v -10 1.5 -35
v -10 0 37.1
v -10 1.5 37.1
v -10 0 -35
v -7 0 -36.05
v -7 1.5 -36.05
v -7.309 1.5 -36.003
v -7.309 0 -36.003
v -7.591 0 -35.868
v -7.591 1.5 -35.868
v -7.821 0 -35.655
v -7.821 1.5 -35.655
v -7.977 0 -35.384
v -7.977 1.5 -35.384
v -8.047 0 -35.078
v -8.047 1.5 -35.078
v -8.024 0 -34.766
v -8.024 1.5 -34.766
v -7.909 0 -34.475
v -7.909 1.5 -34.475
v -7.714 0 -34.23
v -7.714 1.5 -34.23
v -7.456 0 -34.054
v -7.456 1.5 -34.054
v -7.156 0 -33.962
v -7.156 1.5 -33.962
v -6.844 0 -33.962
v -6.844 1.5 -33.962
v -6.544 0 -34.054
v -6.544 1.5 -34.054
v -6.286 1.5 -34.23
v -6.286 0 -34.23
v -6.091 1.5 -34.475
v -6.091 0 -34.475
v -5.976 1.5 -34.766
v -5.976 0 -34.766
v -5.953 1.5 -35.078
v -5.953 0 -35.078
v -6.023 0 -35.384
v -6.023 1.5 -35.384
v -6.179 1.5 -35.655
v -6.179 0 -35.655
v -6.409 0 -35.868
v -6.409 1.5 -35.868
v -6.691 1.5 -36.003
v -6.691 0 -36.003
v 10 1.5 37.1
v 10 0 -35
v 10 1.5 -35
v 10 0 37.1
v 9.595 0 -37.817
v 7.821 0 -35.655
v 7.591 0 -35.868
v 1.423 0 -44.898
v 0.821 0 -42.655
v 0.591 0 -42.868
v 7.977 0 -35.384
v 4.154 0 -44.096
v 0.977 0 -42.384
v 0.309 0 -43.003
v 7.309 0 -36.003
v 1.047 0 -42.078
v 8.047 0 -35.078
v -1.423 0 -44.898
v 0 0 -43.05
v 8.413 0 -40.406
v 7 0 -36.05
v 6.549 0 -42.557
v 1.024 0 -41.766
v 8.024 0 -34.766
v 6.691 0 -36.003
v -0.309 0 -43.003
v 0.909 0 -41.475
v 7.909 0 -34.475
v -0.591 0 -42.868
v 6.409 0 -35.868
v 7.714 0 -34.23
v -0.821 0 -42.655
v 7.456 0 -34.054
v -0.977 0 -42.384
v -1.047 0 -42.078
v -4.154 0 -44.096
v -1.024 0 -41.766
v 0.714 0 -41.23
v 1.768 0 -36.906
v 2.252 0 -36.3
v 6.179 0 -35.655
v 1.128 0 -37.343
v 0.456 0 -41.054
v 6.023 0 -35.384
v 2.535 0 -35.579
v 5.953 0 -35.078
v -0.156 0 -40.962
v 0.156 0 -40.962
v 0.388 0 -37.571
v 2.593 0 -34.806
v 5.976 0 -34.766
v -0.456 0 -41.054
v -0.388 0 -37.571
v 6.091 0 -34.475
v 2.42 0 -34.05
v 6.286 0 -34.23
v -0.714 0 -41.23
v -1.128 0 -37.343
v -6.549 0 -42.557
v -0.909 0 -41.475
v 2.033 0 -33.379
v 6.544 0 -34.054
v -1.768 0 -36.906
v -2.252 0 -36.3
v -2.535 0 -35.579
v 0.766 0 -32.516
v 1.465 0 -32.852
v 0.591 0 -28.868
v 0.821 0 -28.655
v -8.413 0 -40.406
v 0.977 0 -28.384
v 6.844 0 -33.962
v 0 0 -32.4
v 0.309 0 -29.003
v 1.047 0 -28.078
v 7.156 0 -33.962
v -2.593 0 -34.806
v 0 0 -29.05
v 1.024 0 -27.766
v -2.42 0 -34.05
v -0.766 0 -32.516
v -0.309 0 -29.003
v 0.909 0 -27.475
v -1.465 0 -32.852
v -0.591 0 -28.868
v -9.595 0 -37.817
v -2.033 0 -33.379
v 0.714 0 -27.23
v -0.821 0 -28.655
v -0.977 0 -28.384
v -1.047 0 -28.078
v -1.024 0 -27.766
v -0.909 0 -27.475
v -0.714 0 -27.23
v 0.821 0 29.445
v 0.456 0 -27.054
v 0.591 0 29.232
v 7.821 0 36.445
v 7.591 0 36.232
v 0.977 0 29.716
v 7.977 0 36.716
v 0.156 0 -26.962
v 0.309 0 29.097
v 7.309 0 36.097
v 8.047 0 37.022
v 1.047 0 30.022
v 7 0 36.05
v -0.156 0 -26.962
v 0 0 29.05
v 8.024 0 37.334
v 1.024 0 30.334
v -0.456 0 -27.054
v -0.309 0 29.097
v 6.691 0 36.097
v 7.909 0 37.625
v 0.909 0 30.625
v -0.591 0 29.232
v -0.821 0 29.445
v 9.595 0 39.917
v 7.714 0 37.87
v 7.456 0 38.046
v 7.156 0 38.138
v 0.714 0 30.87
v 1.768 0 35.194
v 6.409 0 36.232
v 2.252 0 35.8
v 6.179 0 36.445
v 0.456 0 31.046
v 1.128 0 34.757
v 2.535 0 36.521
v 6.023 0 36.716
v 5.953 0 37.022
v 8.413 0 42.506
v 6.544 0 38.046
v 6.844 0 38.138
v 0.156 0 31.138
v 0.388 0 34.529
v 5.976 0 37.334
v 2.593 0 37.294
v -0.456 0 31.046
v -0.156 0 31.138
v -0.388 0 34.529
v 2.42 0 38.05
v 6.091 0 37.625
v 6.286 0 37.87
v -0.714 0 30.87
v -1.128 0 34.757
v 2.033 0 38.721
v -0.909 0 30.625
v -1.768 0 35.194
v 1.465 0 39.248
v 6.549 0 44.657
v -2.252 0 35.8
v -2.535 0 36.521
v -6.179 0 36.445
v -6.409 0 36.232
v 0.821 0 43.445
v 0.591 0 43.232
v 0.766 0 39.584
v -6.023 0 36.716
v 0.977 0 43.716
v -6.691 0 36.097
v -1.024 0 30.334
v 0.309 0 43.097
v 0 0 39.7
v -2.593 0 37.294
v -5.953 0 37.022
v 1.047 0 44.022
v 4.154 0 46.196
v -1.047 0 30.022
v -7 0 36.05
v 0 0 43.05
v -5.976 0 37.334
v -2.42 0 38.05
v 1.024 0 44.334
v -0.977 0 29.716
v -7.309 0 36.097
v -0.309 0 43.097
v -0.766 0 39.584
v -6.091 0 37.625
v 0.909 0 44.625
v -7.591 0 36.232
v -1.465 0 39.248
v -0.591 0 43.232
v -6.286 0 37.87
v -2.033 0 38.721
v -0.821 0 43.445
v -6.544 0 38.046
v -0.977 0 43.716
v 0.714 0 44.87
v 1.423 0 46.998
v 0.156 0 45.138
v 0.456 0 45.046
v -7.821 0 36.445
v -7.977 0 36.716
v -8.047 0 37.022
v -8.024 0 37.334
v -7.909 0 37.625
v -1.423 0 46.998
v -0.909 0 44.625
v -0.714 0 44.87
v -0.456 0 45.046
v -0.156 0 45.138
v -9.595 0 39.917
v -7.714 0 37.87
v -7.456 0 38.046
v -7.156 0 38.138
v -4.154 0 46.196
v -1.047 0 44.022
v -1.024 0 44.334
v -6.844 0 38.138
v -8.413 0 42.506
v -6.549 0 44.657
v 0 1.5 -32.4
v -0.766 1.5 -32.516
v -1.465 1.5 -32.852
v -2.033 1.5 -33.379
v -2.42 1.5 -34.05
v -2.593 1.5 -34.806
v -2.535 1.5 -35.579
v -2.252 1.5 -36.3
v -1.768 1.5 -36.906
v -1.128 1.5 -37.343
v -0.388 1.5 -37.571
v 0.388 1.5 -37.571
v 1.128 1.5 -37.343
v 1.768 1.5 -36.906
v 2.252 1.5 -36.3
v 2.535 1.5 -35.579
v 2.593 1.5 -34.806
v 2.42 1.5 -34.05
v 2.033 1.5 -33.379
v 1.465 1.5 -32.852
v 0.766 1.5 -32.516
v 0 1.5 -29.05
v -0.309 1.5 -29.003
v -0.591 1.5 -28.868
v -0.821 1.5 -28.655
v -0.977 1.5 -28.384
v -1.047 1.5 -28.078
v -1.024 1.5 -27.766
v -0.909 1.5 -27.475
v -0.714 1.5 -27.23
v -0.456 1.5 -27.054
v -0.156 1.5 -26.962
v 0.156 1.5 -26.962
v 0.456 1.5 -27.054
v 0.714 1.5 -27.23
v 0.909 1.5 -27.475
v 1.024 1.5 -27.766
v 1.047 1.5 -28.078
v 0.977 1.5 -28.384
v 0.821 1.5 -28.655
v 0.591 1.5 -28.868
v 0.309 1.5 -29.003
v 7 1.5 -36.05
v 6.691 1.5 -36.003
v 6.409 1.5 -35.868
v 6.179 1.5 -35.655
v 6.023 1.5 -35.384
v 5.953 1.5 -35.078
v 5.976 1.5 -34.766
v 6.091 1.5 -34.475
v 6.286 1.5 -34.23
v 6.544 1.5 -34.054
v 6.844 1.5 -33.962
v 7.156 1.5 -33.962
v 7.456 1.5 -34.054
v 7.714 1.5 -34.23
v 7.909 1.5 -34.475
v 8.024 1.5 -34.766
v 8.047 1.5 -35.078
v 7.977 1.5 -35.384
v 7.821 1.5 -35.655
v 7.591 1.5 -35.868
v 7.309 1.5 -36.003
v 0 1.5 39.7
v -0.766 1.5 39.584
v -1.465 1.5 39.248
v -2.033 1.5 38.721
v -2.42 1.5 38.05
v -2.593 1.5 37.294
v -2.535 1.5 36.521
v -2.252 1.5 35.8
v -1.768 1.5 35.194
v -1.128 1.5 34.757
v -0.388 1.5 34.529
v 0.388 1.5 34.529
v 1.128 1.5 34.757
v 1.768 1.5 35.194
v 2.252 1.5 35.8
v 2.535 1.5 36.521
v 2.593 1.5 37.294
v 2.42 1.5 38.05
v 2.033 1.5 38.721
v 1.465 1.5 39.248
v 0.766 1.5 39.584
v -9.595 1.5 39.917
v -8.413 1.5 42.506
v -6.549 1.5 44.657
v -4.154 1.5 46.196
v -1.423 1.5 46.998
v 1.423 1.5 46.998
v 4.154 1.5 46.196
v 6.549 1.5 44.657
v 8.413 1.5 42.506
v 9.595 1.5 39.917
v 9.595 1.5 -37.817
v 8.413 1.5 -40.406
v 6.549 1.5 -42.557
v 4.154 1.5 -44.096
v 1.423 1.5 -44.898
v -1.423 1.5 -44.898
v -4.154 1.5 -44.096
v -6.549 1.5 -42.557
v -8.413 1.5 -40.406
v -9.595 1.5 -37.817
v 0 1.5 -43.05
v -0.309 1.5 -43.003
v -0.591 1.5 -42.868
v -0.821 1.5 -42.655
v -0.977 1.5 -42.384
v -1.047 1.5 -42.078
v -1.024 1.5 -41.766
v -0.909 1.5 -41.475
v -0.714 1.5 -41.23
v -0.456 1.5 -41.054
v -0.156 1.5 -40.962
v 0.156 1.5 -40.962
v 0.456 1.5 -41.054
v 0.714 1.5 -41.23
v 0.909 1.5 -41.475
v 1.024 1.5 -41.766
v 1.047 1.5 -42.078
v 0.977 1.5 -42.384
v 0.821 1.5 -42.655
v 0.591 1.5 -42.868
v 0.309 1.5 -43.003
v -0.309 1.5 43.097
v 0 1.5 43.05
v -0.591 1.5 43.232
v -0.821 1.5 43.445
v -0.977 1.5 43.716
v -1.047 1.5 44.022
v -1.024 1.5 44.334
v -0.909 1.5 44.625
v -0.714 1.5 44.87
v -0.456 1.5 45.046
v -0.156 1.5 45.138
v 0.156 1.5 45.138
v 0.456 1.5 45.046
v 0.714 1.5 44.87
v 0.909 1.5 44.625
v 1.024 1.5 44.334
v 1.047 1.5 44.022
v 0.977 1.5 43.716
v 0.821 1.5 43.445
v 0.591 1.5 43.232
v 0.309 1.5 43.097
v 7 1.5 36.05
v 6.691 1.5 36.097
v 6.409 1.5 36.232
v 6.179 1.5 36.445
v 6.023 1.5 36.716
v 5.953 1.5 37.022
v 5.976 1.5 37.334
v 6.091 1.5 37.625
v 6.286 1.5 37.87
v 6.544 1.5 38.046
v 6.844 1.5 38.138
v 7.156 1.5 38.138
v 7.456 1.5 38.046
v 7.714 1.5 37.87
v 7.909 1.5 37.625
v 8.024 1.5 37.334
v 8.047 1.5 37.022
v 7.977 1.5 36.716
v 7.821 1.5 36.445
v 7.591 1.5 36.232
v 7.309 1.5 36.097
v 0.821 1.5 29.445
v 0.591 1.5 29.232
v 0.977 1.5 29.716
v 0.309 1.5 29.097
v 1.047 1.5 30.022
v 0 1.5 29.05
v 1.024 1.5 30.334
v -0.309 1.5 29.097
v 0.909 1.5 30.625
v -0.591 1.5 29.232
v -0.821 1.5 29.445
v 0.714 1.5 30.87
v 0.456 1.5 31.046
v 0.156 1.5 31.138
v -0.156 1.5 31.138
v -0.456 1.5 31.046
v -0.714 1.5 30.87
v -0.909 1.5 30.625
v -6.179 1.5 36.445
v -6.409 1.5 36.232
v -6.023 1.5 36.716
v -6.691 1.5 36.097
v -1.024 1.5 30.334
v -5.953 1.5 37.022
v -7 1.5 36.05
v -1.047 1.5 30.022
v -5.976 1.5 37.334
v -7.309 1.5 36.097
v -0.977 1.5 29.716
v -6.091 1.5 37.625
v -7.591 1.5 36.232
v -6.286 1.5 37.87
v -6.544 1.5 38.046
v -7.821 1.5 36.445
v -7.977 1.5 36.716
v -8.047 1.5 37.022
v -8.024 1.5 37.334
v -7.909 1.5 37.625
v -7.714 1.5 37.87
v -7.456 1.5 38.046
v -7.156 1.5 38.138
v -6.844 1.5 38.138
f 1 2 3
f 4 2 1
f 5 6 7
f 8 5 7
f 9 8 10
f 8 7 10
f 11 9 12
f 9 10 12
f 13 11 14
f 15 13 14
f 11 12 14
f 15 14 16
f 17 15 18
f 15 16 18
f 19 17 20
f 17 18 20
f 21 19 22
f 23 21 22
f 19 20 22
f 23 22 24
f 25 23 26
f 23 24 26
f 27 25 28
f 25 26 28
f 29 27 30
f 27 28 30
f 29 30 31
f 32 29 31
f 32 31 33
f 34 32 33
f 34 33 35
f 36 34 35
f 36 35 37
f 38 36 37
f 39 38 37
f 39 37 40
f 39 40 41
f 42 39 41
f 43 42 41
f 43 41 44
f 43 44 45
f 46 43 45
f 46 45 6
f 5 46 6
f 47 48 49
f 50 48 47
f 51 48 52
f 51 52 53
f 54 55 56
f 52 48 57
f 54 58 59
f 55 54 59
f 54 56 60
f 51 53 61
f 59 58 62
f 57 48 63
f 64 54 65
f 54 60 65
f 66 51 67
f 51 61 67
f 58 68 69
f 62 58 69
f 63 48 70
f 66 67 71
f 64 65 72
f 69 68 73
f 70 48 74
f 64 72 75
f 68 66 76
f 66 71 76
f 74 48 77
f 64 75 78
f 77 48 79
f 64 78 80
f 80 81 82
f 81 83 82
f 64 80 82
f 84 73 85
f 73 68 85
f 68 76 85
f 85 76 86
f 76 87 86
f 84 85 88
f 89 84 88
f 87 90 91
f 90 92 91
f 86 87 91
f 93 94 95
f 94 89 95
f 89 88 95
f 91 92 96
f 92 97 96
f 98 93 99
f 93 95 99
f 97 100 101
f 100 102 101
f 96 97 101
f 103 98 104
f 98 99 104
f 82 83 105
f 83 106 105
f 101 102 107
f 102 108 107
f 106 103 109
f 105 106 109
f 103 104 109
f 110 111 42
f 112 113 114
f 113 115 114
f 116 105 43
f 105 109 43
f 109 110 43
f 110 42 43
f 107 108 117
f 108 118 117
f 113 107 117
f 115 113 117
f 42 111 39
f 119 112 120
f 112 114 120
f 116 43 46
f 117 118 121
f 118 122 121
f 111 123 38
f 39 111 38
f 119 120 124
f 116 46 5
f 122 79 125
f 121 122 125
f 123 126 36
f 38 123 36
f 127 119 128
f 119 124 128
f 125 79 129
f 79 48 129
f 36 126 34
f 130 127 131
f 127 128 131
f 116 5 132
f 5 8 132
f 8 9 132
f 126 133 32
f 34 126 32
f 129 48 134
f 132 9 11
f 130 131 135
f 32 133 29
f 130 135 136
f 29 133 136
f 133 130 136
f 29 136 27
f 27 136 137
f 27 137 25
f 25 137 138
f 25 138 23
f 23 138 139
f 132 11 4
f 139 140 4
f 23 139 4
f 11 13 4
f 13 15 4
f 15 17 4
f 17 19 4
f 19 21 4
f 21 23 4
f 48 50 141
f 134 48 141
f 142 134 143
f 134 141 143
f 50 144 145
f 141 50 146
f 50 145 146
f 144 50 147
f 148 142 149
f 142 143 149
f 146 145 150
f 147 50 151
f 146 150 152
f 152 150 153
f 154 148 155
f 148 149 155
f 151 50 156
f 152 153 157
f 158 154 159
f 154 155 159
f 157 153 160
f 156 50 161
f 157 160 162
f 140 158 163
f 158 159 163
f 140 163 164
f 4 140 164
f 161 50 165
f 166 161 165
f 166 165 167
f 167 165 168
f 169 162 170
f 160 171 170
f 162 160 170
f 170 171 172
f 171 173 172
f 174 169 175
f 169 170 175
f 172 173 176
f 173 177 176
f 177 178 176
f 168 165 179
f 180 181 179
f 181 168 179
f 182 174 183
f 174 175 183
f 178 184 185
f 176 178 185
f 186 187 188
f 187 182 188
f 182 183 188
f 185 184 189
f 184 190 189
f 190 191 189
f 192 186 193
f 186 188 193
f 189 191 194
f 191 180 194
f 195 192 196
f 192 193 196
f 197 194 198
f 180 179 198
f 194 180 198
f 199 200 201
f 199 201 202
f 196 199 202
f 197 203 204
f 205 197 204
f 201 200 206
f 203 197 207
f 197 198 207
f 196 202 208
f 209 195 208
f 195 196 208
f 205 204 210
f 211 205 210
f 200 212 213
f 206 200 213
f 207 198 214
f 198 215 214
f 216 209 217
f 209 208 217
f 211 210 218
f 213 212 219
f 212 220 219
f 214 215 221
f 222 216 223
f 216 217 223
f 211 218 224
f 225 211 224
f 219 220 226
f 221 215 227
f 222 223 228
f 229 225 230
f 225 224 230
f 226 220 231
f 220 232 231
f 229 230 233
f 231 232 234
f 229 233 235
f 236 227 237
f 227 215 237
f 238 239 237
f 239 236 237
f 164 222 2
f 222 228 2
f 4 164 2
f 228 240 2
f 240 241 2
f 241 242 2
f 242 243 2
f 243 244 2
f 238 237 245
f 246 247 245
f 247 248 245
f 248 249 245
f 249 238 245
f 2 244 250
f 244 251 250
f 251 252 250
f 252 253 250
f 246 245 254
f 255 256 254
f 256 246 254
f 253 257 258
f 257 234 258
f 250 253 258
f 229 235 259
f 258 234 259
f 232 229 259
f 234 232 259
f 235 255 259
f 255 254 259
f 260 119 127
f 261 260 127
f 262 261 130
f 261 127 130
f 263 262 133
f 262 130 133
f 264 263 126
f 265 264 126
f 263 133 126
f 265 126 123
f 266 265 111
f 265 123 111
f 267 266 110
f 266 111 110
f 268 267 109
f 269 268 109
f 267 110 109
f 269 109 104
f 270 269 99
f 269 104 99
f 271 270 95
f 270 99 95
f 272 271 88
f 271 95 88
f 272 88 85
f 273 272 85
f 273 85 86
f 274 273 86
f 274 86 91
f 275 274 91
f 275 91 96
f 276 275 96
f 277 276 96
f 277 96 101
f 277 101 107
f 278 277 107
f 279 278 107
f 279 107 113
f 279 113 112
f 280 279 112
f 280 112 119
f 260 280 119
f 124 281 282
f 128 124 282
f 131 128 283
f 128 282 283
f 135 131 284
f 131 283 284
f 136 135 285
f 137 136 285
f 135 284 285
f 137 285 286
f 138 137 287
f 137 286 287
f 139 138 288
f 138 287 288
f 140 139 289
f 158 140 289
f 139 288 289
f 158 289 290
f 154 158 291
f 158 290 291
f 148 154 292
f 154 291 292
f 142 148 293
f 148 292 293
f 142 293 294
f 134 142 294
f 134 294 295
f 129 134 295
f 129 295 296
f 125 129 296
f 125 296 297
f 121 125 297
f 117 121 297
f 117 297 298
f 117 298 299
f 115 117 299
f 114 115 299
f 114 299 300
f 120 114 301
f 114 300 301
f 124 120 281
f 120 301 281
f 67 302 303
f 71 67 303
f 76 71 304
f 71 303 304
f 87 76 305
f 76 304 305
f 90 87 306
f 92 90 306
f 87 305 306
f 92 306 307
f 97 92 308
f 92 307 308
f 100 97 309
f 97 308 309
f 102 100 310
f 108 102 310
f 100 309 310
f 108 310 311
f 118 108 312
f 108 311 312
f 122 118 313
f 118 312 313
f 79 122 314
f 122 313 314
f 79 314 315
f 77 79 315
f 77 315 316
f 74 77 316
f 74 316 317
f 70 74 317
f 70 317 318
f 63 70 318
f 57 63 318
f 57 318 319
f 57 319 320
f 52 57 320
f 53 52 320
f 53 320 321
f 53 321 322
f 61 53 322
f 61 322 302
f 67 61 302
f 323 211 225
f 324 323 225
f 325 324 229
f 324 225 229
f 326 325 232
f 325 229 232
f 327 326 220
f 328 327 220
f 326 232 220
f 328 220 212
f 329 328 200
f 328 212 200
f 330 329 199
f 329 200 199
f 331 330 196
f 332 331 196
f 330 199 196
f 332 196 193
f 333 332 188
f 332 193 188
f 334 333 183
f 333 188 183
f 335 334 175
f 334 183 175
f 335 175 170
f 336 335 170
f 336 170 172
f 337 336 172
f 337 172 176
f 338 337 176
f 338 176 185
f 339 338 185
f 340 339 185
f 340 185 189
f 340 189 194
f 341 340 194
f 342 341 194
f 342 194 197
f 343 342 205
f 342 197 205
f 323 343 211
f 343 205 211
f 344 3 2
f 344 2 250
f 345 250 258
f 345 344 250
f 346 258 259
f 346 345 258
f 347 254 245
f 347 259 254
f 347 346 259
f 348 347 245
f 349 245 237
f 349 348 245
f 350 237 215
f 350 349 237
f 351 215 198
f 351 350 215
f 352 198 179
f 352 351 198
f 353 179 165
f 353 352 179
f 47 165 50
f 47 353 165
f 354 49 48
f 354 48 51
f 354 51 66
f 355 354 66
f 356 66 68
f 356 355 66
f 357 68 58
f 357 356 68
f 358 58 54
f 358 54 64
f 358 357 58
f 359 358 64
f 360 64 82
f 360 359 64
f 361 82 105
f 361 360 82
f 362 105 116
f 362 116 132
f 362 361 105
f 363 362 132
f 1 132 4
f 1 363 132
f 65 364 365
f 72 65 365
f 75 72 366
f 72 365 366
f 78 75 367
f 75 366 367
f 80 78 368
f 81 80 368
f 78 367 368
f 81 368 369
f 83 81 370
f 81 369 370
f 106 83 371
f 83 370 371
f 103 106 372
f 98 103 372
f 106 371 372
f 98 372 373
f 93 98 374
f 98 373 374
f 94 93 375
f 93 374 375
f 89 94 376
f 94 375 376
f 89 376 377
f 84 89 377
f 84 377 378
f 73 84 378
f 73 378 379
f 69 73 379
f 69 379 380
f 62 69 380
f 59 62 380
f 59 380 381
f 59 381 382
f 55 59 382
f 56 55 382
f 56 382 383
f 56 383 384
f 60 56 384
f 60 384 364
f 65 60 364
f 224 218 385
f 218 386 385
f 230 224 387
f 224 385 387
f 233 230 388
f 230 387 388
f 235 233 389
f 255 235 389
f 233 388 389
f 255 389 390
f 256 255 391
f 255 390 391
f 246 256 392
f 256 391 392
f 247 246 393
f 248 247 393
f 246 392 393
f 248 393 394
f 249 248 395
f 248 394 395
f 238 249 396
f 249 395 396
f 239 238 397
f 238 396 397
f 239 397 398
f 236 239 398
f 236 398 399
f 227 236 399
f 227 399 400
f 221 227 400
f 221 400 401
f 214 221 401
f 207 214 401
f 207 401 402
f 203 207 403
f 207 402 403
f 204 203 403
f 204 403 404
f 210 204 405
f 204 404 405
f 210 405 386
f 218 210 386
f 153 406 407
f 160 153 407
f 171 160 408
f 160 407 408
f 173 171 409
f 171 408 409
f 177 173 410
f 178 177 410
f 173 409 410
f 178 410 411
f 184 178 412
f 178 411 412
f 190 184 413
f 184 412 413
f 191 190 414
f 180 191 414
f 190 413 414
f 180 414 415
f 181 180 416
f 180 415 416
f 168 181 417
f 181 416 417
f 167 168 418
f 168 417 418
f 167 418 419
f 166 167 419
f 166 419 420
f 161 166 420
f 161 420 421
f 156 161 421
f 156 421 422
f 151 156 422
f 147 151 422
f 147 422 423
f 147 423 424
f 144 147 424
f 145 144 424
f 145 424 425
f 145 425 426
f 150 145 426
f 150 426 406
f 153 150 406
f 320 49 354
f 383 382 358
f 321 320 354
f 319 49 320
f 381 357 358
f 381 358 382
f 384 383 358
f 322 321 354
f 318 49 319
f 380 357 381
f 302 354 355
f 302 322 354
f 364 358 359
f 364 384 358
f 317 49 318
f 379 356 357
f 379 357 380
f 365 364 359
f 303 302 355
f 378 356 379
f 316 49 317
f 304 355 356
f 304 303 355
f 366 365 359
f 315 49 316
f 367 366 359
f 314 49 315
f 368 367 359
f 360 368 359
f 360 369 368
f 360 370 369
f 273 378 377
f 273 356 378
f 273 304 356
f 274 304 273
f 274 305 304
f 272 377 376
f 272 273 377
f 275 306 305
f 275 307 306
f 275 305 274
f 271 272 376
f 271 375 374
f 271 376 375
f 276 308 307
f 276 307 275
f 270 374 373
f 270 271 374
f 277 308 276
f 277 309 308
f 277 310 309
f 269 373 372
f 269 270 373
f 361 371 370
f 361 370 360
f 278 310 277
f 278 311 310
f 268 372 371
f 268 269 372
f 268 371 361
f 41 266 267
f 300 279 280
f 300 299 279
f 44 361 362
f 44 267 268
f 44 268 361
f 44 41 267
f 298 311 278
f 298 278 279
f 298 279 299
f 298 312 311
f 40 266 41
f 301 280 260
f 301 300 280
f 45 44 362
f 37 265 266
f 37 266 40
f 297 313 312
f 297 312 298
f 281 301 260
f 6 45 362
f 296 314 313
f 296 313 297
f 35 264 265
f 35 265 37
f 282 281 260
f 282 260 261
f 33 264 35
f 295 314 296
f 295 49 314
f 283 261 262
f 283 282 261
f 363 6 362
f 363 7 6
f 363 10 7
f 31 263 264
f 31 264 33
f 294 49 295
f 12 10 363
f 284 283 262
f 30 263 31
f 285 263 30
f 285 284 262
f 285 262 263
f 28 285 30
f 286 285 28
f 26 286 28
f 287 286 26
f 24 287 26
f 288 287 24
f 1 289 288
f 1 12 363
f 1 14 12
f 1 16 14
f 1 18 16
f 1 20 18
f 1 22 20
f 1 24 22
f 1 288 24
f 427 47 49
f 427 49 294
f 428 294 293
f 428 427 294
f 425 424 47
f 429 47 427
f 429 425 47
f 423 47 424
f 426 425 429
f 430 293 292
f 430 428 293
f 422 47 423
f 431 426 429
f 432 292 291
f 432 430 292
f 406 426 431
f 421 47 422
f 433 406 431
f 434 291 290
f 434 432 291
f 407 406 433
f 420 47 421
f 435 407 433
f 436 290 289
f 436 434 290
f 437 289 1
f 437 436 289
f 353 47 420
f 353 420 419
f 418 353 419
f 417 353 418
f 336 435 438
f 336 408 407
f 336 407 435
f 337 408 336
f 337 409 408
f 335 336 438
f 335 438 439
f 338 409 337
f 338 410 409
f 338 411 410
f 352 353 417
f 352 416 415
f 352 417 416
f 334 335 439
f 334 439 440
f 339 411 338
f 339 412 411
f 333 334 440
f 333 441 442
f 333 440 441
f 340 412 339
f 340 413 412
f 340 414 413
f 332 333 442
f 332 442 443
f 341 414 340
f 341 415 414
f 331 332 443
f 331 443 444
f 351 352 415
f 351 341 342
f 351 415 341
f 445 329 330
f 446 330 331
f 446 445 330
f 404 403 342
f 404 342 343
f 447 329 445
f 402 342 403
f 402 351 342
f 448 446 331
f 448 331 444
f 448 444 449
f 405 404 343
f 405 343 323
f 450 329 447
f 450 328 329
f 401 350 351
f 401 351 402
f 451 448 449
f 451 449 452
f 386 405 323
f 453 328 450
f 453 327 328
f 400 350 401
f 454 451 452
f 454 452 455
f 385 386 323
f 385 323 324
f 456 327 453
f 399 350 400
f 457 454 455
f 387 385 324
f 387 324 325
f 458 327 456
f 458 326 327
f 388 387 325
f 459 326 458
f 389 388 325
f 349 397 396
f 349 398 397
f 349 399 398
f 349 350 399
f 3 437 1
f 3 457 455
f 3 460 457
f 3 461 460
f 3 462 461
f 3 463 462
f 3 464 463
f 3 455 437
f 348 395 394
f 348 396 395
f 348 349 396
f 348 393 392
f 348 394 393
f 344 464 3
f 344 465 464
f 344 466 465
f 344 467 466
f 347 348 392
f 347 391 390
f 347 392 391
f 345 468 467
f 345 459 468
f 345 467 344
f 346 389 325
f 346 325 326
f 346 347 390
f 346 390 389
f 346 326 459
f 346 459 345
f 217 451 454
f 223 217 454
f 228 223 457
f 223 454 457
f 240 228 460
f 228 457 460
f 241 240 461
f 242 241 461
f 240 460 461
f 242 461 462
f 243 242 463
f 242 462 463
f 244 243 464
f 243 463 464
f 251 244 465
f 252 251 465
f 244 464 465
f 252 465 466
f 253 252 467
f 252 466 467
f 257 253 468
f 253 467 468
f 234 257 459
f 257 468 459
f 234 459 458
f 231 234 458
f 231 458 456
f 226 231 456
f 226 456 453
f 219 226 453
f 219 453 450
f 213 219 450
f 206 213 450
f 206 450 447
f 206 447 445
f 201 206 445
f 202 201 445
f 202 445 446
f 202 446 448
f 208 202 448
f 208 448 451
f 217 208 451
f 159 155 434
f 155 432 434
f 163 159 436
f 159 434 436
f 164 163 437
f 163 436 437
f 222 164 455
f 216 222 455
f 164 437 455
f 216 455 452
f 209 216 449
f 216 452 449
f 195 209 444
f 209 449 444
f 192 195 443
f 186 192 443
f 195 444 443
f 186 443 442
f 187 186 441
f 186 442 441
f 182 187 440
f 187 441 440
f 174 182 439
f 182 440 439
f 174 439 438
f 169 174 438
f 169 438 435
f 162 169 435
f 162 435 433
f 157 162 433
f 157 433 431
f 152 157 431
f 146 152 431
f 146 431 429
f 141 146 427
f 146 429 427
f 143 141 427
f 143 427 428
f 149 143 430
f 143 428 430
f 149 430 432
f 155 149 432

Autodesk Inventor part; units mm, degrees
ref_plane "YZ Plane" through (0, 0, 0) normal (1, 0, 0) x (0, 1, 0)
ref_plane "XZ Plane" through (0, 0, 0) normal (0, 1, 0) x (-1, 0, 0)
ref_plane "XY Plane" through (0, 0, 0) normal (0, 0, 1) x (1, 0, 0)
sketch "Sketch1" plane through (0, 0, 0) normal (0, 1, 0) x (-1, 0, 0)
  line L0 (10, -45) -> (-10, -45)
  line L1 (-10, -45) -> (-10, 47.1)
  line L2 (-10, 47.1) -> (10, 47.1)
  line L3 (10, 47.1) -> (10, -45)
  point P0 (0, 0)
  dimension "d0" = 20
  dimension "d1" = 92.1
  dimension "d2" = 45
  dimension "d3" = 10
extrude "Plate1" add sketch "Sketch1" along normal blind 1.5
sketch "Sketch2" plane through (0, 0, 0) normal (0, -1, 0) x (1, 0, 0)
  circle A0 centre (0, 42) radius 0.7835 projected
  circle A1 centre (-7, 35) radius 0.7835 projected
  circle A2 centre (0, 28) radius 0.7835 projected
  circle A3 centre (7, 35) radius 0.7835 projected
  circle A4 centre (0, -28) radius 0.7835 projected
  circle A5 centre (-7, -35) radius 0.7835 projected
  circle A6 centre (0, -42) radius 0.7835 projected
  circle A7 centre (7, -35) radius 0.7835 projected
  circle A8 centre (7, 37.1) radius 0.7835
  circle A9 centre (0, 30.1) radius 0.7835
  circle A10 centre (-7, 37.1) radius 0.7835
  circle A11 centre (0, 44.1) radius 0.7835
  point P0 (0, 0)
hole "Hole1" at (0, 0, 30.1) at (7, 0, 37.1) at (0, 0, 44.1) at (-7, 0, 37.1) at (0, 0, -42) at (7, 0, -35) at (0, 0, -28) at (-7, 0, -35) direction (0, 1, 0) diameter 2.1 depth 1.5
sketch "Sketch3" plane through (0, 1.5, 0) normal (0, 1, 0) x (1, 0, 0)
  arc A0 (10, 35) -> (-10, 35) centre (0, 35) ccw
  arc A1 (-10, -37.1) -> (10, -37.1) centre (0, -37.1) ccw
  line L0 (-10, 35) -> (-10, -37.1)
  line L1 (10, 35) -> (10, -37.1)
  line L2 (10, 45) -> (10, -47.1) projected
  line L3 (-10, 45) -> (10, 45)
  line L4 (10, 45) -> (10, -47.1)
  line L5 (10, -47.1) -> (-10, -47.1)
  line L6 (-10, -47.1) -> (-10, 45)
  point P0 (0, 0)
  point P1 (0, 45)
  point P2 (10, 45)
  point P3 (10, 35)
  point P4 (-10, -37.1)
  point P5 (0, -47.1)
  point P6 (1.4107, 44.9)
  point P7 (10, 35)
  dimension "d12" = 35
  dimension "d13" = 37.1
  dimension "d14" = 10
  dimension "d15" = 10
  dimension "d16" = 10
  dimension "d17" = 20
  dimension "d18" = 92.1
extrude "Extrusion1" cut sketch "Sketch3" against normal blind 10 contours A0 L3 L2 | A0 L6 L3 | L2 L5 A1 | L5 L6 A1
sketch "Sketch4" plane through (0, 1.5, 0) normal (0, 1, 0) x (1, 0, 0)
  arc A0 (10, 35) -> (-10, 35) centre (0, 35) ccw projected
  arc A1 (-10, -37.1) -> (10, -37.1) centre (0, -37.1) ccw projected
  point P0 (0, 0)
hole "Hole2" at (0, 1.5, -35) at (0, 1.5, 37.1) direction (0, -1, 0) diameter 5.2 depth 1.5 clearance for "Hex Head Bolt" size "M5" standard "Ansi Metric M Profile"
equation "\"d10\" = Thickness"
equation "\"d26\" = Thickness"
equation "\"d4\" = Thickness"
equation "\"BendReliefWidth\" = Thickness"
equation "\"BendReliefDepth\" = 0.5 * Thickness"
equation "\"CornerReliefSize\" = 4 * Thickness"
equation "\"MinimumRemnant\" = 2 * Thickness"
equation "\"TransitionRadius\" = BendRadius"
equation "\"JacobiRadiusSize\" = BendRadius"
equation "\"GapSize\" = Thickness"
equation "\"Thickness\" = 1.5"
equation "\"BendRadius\" = 0.31"
properties part number "axis_10_11-connector_frame" material "Aluminum 6061-AHC"
